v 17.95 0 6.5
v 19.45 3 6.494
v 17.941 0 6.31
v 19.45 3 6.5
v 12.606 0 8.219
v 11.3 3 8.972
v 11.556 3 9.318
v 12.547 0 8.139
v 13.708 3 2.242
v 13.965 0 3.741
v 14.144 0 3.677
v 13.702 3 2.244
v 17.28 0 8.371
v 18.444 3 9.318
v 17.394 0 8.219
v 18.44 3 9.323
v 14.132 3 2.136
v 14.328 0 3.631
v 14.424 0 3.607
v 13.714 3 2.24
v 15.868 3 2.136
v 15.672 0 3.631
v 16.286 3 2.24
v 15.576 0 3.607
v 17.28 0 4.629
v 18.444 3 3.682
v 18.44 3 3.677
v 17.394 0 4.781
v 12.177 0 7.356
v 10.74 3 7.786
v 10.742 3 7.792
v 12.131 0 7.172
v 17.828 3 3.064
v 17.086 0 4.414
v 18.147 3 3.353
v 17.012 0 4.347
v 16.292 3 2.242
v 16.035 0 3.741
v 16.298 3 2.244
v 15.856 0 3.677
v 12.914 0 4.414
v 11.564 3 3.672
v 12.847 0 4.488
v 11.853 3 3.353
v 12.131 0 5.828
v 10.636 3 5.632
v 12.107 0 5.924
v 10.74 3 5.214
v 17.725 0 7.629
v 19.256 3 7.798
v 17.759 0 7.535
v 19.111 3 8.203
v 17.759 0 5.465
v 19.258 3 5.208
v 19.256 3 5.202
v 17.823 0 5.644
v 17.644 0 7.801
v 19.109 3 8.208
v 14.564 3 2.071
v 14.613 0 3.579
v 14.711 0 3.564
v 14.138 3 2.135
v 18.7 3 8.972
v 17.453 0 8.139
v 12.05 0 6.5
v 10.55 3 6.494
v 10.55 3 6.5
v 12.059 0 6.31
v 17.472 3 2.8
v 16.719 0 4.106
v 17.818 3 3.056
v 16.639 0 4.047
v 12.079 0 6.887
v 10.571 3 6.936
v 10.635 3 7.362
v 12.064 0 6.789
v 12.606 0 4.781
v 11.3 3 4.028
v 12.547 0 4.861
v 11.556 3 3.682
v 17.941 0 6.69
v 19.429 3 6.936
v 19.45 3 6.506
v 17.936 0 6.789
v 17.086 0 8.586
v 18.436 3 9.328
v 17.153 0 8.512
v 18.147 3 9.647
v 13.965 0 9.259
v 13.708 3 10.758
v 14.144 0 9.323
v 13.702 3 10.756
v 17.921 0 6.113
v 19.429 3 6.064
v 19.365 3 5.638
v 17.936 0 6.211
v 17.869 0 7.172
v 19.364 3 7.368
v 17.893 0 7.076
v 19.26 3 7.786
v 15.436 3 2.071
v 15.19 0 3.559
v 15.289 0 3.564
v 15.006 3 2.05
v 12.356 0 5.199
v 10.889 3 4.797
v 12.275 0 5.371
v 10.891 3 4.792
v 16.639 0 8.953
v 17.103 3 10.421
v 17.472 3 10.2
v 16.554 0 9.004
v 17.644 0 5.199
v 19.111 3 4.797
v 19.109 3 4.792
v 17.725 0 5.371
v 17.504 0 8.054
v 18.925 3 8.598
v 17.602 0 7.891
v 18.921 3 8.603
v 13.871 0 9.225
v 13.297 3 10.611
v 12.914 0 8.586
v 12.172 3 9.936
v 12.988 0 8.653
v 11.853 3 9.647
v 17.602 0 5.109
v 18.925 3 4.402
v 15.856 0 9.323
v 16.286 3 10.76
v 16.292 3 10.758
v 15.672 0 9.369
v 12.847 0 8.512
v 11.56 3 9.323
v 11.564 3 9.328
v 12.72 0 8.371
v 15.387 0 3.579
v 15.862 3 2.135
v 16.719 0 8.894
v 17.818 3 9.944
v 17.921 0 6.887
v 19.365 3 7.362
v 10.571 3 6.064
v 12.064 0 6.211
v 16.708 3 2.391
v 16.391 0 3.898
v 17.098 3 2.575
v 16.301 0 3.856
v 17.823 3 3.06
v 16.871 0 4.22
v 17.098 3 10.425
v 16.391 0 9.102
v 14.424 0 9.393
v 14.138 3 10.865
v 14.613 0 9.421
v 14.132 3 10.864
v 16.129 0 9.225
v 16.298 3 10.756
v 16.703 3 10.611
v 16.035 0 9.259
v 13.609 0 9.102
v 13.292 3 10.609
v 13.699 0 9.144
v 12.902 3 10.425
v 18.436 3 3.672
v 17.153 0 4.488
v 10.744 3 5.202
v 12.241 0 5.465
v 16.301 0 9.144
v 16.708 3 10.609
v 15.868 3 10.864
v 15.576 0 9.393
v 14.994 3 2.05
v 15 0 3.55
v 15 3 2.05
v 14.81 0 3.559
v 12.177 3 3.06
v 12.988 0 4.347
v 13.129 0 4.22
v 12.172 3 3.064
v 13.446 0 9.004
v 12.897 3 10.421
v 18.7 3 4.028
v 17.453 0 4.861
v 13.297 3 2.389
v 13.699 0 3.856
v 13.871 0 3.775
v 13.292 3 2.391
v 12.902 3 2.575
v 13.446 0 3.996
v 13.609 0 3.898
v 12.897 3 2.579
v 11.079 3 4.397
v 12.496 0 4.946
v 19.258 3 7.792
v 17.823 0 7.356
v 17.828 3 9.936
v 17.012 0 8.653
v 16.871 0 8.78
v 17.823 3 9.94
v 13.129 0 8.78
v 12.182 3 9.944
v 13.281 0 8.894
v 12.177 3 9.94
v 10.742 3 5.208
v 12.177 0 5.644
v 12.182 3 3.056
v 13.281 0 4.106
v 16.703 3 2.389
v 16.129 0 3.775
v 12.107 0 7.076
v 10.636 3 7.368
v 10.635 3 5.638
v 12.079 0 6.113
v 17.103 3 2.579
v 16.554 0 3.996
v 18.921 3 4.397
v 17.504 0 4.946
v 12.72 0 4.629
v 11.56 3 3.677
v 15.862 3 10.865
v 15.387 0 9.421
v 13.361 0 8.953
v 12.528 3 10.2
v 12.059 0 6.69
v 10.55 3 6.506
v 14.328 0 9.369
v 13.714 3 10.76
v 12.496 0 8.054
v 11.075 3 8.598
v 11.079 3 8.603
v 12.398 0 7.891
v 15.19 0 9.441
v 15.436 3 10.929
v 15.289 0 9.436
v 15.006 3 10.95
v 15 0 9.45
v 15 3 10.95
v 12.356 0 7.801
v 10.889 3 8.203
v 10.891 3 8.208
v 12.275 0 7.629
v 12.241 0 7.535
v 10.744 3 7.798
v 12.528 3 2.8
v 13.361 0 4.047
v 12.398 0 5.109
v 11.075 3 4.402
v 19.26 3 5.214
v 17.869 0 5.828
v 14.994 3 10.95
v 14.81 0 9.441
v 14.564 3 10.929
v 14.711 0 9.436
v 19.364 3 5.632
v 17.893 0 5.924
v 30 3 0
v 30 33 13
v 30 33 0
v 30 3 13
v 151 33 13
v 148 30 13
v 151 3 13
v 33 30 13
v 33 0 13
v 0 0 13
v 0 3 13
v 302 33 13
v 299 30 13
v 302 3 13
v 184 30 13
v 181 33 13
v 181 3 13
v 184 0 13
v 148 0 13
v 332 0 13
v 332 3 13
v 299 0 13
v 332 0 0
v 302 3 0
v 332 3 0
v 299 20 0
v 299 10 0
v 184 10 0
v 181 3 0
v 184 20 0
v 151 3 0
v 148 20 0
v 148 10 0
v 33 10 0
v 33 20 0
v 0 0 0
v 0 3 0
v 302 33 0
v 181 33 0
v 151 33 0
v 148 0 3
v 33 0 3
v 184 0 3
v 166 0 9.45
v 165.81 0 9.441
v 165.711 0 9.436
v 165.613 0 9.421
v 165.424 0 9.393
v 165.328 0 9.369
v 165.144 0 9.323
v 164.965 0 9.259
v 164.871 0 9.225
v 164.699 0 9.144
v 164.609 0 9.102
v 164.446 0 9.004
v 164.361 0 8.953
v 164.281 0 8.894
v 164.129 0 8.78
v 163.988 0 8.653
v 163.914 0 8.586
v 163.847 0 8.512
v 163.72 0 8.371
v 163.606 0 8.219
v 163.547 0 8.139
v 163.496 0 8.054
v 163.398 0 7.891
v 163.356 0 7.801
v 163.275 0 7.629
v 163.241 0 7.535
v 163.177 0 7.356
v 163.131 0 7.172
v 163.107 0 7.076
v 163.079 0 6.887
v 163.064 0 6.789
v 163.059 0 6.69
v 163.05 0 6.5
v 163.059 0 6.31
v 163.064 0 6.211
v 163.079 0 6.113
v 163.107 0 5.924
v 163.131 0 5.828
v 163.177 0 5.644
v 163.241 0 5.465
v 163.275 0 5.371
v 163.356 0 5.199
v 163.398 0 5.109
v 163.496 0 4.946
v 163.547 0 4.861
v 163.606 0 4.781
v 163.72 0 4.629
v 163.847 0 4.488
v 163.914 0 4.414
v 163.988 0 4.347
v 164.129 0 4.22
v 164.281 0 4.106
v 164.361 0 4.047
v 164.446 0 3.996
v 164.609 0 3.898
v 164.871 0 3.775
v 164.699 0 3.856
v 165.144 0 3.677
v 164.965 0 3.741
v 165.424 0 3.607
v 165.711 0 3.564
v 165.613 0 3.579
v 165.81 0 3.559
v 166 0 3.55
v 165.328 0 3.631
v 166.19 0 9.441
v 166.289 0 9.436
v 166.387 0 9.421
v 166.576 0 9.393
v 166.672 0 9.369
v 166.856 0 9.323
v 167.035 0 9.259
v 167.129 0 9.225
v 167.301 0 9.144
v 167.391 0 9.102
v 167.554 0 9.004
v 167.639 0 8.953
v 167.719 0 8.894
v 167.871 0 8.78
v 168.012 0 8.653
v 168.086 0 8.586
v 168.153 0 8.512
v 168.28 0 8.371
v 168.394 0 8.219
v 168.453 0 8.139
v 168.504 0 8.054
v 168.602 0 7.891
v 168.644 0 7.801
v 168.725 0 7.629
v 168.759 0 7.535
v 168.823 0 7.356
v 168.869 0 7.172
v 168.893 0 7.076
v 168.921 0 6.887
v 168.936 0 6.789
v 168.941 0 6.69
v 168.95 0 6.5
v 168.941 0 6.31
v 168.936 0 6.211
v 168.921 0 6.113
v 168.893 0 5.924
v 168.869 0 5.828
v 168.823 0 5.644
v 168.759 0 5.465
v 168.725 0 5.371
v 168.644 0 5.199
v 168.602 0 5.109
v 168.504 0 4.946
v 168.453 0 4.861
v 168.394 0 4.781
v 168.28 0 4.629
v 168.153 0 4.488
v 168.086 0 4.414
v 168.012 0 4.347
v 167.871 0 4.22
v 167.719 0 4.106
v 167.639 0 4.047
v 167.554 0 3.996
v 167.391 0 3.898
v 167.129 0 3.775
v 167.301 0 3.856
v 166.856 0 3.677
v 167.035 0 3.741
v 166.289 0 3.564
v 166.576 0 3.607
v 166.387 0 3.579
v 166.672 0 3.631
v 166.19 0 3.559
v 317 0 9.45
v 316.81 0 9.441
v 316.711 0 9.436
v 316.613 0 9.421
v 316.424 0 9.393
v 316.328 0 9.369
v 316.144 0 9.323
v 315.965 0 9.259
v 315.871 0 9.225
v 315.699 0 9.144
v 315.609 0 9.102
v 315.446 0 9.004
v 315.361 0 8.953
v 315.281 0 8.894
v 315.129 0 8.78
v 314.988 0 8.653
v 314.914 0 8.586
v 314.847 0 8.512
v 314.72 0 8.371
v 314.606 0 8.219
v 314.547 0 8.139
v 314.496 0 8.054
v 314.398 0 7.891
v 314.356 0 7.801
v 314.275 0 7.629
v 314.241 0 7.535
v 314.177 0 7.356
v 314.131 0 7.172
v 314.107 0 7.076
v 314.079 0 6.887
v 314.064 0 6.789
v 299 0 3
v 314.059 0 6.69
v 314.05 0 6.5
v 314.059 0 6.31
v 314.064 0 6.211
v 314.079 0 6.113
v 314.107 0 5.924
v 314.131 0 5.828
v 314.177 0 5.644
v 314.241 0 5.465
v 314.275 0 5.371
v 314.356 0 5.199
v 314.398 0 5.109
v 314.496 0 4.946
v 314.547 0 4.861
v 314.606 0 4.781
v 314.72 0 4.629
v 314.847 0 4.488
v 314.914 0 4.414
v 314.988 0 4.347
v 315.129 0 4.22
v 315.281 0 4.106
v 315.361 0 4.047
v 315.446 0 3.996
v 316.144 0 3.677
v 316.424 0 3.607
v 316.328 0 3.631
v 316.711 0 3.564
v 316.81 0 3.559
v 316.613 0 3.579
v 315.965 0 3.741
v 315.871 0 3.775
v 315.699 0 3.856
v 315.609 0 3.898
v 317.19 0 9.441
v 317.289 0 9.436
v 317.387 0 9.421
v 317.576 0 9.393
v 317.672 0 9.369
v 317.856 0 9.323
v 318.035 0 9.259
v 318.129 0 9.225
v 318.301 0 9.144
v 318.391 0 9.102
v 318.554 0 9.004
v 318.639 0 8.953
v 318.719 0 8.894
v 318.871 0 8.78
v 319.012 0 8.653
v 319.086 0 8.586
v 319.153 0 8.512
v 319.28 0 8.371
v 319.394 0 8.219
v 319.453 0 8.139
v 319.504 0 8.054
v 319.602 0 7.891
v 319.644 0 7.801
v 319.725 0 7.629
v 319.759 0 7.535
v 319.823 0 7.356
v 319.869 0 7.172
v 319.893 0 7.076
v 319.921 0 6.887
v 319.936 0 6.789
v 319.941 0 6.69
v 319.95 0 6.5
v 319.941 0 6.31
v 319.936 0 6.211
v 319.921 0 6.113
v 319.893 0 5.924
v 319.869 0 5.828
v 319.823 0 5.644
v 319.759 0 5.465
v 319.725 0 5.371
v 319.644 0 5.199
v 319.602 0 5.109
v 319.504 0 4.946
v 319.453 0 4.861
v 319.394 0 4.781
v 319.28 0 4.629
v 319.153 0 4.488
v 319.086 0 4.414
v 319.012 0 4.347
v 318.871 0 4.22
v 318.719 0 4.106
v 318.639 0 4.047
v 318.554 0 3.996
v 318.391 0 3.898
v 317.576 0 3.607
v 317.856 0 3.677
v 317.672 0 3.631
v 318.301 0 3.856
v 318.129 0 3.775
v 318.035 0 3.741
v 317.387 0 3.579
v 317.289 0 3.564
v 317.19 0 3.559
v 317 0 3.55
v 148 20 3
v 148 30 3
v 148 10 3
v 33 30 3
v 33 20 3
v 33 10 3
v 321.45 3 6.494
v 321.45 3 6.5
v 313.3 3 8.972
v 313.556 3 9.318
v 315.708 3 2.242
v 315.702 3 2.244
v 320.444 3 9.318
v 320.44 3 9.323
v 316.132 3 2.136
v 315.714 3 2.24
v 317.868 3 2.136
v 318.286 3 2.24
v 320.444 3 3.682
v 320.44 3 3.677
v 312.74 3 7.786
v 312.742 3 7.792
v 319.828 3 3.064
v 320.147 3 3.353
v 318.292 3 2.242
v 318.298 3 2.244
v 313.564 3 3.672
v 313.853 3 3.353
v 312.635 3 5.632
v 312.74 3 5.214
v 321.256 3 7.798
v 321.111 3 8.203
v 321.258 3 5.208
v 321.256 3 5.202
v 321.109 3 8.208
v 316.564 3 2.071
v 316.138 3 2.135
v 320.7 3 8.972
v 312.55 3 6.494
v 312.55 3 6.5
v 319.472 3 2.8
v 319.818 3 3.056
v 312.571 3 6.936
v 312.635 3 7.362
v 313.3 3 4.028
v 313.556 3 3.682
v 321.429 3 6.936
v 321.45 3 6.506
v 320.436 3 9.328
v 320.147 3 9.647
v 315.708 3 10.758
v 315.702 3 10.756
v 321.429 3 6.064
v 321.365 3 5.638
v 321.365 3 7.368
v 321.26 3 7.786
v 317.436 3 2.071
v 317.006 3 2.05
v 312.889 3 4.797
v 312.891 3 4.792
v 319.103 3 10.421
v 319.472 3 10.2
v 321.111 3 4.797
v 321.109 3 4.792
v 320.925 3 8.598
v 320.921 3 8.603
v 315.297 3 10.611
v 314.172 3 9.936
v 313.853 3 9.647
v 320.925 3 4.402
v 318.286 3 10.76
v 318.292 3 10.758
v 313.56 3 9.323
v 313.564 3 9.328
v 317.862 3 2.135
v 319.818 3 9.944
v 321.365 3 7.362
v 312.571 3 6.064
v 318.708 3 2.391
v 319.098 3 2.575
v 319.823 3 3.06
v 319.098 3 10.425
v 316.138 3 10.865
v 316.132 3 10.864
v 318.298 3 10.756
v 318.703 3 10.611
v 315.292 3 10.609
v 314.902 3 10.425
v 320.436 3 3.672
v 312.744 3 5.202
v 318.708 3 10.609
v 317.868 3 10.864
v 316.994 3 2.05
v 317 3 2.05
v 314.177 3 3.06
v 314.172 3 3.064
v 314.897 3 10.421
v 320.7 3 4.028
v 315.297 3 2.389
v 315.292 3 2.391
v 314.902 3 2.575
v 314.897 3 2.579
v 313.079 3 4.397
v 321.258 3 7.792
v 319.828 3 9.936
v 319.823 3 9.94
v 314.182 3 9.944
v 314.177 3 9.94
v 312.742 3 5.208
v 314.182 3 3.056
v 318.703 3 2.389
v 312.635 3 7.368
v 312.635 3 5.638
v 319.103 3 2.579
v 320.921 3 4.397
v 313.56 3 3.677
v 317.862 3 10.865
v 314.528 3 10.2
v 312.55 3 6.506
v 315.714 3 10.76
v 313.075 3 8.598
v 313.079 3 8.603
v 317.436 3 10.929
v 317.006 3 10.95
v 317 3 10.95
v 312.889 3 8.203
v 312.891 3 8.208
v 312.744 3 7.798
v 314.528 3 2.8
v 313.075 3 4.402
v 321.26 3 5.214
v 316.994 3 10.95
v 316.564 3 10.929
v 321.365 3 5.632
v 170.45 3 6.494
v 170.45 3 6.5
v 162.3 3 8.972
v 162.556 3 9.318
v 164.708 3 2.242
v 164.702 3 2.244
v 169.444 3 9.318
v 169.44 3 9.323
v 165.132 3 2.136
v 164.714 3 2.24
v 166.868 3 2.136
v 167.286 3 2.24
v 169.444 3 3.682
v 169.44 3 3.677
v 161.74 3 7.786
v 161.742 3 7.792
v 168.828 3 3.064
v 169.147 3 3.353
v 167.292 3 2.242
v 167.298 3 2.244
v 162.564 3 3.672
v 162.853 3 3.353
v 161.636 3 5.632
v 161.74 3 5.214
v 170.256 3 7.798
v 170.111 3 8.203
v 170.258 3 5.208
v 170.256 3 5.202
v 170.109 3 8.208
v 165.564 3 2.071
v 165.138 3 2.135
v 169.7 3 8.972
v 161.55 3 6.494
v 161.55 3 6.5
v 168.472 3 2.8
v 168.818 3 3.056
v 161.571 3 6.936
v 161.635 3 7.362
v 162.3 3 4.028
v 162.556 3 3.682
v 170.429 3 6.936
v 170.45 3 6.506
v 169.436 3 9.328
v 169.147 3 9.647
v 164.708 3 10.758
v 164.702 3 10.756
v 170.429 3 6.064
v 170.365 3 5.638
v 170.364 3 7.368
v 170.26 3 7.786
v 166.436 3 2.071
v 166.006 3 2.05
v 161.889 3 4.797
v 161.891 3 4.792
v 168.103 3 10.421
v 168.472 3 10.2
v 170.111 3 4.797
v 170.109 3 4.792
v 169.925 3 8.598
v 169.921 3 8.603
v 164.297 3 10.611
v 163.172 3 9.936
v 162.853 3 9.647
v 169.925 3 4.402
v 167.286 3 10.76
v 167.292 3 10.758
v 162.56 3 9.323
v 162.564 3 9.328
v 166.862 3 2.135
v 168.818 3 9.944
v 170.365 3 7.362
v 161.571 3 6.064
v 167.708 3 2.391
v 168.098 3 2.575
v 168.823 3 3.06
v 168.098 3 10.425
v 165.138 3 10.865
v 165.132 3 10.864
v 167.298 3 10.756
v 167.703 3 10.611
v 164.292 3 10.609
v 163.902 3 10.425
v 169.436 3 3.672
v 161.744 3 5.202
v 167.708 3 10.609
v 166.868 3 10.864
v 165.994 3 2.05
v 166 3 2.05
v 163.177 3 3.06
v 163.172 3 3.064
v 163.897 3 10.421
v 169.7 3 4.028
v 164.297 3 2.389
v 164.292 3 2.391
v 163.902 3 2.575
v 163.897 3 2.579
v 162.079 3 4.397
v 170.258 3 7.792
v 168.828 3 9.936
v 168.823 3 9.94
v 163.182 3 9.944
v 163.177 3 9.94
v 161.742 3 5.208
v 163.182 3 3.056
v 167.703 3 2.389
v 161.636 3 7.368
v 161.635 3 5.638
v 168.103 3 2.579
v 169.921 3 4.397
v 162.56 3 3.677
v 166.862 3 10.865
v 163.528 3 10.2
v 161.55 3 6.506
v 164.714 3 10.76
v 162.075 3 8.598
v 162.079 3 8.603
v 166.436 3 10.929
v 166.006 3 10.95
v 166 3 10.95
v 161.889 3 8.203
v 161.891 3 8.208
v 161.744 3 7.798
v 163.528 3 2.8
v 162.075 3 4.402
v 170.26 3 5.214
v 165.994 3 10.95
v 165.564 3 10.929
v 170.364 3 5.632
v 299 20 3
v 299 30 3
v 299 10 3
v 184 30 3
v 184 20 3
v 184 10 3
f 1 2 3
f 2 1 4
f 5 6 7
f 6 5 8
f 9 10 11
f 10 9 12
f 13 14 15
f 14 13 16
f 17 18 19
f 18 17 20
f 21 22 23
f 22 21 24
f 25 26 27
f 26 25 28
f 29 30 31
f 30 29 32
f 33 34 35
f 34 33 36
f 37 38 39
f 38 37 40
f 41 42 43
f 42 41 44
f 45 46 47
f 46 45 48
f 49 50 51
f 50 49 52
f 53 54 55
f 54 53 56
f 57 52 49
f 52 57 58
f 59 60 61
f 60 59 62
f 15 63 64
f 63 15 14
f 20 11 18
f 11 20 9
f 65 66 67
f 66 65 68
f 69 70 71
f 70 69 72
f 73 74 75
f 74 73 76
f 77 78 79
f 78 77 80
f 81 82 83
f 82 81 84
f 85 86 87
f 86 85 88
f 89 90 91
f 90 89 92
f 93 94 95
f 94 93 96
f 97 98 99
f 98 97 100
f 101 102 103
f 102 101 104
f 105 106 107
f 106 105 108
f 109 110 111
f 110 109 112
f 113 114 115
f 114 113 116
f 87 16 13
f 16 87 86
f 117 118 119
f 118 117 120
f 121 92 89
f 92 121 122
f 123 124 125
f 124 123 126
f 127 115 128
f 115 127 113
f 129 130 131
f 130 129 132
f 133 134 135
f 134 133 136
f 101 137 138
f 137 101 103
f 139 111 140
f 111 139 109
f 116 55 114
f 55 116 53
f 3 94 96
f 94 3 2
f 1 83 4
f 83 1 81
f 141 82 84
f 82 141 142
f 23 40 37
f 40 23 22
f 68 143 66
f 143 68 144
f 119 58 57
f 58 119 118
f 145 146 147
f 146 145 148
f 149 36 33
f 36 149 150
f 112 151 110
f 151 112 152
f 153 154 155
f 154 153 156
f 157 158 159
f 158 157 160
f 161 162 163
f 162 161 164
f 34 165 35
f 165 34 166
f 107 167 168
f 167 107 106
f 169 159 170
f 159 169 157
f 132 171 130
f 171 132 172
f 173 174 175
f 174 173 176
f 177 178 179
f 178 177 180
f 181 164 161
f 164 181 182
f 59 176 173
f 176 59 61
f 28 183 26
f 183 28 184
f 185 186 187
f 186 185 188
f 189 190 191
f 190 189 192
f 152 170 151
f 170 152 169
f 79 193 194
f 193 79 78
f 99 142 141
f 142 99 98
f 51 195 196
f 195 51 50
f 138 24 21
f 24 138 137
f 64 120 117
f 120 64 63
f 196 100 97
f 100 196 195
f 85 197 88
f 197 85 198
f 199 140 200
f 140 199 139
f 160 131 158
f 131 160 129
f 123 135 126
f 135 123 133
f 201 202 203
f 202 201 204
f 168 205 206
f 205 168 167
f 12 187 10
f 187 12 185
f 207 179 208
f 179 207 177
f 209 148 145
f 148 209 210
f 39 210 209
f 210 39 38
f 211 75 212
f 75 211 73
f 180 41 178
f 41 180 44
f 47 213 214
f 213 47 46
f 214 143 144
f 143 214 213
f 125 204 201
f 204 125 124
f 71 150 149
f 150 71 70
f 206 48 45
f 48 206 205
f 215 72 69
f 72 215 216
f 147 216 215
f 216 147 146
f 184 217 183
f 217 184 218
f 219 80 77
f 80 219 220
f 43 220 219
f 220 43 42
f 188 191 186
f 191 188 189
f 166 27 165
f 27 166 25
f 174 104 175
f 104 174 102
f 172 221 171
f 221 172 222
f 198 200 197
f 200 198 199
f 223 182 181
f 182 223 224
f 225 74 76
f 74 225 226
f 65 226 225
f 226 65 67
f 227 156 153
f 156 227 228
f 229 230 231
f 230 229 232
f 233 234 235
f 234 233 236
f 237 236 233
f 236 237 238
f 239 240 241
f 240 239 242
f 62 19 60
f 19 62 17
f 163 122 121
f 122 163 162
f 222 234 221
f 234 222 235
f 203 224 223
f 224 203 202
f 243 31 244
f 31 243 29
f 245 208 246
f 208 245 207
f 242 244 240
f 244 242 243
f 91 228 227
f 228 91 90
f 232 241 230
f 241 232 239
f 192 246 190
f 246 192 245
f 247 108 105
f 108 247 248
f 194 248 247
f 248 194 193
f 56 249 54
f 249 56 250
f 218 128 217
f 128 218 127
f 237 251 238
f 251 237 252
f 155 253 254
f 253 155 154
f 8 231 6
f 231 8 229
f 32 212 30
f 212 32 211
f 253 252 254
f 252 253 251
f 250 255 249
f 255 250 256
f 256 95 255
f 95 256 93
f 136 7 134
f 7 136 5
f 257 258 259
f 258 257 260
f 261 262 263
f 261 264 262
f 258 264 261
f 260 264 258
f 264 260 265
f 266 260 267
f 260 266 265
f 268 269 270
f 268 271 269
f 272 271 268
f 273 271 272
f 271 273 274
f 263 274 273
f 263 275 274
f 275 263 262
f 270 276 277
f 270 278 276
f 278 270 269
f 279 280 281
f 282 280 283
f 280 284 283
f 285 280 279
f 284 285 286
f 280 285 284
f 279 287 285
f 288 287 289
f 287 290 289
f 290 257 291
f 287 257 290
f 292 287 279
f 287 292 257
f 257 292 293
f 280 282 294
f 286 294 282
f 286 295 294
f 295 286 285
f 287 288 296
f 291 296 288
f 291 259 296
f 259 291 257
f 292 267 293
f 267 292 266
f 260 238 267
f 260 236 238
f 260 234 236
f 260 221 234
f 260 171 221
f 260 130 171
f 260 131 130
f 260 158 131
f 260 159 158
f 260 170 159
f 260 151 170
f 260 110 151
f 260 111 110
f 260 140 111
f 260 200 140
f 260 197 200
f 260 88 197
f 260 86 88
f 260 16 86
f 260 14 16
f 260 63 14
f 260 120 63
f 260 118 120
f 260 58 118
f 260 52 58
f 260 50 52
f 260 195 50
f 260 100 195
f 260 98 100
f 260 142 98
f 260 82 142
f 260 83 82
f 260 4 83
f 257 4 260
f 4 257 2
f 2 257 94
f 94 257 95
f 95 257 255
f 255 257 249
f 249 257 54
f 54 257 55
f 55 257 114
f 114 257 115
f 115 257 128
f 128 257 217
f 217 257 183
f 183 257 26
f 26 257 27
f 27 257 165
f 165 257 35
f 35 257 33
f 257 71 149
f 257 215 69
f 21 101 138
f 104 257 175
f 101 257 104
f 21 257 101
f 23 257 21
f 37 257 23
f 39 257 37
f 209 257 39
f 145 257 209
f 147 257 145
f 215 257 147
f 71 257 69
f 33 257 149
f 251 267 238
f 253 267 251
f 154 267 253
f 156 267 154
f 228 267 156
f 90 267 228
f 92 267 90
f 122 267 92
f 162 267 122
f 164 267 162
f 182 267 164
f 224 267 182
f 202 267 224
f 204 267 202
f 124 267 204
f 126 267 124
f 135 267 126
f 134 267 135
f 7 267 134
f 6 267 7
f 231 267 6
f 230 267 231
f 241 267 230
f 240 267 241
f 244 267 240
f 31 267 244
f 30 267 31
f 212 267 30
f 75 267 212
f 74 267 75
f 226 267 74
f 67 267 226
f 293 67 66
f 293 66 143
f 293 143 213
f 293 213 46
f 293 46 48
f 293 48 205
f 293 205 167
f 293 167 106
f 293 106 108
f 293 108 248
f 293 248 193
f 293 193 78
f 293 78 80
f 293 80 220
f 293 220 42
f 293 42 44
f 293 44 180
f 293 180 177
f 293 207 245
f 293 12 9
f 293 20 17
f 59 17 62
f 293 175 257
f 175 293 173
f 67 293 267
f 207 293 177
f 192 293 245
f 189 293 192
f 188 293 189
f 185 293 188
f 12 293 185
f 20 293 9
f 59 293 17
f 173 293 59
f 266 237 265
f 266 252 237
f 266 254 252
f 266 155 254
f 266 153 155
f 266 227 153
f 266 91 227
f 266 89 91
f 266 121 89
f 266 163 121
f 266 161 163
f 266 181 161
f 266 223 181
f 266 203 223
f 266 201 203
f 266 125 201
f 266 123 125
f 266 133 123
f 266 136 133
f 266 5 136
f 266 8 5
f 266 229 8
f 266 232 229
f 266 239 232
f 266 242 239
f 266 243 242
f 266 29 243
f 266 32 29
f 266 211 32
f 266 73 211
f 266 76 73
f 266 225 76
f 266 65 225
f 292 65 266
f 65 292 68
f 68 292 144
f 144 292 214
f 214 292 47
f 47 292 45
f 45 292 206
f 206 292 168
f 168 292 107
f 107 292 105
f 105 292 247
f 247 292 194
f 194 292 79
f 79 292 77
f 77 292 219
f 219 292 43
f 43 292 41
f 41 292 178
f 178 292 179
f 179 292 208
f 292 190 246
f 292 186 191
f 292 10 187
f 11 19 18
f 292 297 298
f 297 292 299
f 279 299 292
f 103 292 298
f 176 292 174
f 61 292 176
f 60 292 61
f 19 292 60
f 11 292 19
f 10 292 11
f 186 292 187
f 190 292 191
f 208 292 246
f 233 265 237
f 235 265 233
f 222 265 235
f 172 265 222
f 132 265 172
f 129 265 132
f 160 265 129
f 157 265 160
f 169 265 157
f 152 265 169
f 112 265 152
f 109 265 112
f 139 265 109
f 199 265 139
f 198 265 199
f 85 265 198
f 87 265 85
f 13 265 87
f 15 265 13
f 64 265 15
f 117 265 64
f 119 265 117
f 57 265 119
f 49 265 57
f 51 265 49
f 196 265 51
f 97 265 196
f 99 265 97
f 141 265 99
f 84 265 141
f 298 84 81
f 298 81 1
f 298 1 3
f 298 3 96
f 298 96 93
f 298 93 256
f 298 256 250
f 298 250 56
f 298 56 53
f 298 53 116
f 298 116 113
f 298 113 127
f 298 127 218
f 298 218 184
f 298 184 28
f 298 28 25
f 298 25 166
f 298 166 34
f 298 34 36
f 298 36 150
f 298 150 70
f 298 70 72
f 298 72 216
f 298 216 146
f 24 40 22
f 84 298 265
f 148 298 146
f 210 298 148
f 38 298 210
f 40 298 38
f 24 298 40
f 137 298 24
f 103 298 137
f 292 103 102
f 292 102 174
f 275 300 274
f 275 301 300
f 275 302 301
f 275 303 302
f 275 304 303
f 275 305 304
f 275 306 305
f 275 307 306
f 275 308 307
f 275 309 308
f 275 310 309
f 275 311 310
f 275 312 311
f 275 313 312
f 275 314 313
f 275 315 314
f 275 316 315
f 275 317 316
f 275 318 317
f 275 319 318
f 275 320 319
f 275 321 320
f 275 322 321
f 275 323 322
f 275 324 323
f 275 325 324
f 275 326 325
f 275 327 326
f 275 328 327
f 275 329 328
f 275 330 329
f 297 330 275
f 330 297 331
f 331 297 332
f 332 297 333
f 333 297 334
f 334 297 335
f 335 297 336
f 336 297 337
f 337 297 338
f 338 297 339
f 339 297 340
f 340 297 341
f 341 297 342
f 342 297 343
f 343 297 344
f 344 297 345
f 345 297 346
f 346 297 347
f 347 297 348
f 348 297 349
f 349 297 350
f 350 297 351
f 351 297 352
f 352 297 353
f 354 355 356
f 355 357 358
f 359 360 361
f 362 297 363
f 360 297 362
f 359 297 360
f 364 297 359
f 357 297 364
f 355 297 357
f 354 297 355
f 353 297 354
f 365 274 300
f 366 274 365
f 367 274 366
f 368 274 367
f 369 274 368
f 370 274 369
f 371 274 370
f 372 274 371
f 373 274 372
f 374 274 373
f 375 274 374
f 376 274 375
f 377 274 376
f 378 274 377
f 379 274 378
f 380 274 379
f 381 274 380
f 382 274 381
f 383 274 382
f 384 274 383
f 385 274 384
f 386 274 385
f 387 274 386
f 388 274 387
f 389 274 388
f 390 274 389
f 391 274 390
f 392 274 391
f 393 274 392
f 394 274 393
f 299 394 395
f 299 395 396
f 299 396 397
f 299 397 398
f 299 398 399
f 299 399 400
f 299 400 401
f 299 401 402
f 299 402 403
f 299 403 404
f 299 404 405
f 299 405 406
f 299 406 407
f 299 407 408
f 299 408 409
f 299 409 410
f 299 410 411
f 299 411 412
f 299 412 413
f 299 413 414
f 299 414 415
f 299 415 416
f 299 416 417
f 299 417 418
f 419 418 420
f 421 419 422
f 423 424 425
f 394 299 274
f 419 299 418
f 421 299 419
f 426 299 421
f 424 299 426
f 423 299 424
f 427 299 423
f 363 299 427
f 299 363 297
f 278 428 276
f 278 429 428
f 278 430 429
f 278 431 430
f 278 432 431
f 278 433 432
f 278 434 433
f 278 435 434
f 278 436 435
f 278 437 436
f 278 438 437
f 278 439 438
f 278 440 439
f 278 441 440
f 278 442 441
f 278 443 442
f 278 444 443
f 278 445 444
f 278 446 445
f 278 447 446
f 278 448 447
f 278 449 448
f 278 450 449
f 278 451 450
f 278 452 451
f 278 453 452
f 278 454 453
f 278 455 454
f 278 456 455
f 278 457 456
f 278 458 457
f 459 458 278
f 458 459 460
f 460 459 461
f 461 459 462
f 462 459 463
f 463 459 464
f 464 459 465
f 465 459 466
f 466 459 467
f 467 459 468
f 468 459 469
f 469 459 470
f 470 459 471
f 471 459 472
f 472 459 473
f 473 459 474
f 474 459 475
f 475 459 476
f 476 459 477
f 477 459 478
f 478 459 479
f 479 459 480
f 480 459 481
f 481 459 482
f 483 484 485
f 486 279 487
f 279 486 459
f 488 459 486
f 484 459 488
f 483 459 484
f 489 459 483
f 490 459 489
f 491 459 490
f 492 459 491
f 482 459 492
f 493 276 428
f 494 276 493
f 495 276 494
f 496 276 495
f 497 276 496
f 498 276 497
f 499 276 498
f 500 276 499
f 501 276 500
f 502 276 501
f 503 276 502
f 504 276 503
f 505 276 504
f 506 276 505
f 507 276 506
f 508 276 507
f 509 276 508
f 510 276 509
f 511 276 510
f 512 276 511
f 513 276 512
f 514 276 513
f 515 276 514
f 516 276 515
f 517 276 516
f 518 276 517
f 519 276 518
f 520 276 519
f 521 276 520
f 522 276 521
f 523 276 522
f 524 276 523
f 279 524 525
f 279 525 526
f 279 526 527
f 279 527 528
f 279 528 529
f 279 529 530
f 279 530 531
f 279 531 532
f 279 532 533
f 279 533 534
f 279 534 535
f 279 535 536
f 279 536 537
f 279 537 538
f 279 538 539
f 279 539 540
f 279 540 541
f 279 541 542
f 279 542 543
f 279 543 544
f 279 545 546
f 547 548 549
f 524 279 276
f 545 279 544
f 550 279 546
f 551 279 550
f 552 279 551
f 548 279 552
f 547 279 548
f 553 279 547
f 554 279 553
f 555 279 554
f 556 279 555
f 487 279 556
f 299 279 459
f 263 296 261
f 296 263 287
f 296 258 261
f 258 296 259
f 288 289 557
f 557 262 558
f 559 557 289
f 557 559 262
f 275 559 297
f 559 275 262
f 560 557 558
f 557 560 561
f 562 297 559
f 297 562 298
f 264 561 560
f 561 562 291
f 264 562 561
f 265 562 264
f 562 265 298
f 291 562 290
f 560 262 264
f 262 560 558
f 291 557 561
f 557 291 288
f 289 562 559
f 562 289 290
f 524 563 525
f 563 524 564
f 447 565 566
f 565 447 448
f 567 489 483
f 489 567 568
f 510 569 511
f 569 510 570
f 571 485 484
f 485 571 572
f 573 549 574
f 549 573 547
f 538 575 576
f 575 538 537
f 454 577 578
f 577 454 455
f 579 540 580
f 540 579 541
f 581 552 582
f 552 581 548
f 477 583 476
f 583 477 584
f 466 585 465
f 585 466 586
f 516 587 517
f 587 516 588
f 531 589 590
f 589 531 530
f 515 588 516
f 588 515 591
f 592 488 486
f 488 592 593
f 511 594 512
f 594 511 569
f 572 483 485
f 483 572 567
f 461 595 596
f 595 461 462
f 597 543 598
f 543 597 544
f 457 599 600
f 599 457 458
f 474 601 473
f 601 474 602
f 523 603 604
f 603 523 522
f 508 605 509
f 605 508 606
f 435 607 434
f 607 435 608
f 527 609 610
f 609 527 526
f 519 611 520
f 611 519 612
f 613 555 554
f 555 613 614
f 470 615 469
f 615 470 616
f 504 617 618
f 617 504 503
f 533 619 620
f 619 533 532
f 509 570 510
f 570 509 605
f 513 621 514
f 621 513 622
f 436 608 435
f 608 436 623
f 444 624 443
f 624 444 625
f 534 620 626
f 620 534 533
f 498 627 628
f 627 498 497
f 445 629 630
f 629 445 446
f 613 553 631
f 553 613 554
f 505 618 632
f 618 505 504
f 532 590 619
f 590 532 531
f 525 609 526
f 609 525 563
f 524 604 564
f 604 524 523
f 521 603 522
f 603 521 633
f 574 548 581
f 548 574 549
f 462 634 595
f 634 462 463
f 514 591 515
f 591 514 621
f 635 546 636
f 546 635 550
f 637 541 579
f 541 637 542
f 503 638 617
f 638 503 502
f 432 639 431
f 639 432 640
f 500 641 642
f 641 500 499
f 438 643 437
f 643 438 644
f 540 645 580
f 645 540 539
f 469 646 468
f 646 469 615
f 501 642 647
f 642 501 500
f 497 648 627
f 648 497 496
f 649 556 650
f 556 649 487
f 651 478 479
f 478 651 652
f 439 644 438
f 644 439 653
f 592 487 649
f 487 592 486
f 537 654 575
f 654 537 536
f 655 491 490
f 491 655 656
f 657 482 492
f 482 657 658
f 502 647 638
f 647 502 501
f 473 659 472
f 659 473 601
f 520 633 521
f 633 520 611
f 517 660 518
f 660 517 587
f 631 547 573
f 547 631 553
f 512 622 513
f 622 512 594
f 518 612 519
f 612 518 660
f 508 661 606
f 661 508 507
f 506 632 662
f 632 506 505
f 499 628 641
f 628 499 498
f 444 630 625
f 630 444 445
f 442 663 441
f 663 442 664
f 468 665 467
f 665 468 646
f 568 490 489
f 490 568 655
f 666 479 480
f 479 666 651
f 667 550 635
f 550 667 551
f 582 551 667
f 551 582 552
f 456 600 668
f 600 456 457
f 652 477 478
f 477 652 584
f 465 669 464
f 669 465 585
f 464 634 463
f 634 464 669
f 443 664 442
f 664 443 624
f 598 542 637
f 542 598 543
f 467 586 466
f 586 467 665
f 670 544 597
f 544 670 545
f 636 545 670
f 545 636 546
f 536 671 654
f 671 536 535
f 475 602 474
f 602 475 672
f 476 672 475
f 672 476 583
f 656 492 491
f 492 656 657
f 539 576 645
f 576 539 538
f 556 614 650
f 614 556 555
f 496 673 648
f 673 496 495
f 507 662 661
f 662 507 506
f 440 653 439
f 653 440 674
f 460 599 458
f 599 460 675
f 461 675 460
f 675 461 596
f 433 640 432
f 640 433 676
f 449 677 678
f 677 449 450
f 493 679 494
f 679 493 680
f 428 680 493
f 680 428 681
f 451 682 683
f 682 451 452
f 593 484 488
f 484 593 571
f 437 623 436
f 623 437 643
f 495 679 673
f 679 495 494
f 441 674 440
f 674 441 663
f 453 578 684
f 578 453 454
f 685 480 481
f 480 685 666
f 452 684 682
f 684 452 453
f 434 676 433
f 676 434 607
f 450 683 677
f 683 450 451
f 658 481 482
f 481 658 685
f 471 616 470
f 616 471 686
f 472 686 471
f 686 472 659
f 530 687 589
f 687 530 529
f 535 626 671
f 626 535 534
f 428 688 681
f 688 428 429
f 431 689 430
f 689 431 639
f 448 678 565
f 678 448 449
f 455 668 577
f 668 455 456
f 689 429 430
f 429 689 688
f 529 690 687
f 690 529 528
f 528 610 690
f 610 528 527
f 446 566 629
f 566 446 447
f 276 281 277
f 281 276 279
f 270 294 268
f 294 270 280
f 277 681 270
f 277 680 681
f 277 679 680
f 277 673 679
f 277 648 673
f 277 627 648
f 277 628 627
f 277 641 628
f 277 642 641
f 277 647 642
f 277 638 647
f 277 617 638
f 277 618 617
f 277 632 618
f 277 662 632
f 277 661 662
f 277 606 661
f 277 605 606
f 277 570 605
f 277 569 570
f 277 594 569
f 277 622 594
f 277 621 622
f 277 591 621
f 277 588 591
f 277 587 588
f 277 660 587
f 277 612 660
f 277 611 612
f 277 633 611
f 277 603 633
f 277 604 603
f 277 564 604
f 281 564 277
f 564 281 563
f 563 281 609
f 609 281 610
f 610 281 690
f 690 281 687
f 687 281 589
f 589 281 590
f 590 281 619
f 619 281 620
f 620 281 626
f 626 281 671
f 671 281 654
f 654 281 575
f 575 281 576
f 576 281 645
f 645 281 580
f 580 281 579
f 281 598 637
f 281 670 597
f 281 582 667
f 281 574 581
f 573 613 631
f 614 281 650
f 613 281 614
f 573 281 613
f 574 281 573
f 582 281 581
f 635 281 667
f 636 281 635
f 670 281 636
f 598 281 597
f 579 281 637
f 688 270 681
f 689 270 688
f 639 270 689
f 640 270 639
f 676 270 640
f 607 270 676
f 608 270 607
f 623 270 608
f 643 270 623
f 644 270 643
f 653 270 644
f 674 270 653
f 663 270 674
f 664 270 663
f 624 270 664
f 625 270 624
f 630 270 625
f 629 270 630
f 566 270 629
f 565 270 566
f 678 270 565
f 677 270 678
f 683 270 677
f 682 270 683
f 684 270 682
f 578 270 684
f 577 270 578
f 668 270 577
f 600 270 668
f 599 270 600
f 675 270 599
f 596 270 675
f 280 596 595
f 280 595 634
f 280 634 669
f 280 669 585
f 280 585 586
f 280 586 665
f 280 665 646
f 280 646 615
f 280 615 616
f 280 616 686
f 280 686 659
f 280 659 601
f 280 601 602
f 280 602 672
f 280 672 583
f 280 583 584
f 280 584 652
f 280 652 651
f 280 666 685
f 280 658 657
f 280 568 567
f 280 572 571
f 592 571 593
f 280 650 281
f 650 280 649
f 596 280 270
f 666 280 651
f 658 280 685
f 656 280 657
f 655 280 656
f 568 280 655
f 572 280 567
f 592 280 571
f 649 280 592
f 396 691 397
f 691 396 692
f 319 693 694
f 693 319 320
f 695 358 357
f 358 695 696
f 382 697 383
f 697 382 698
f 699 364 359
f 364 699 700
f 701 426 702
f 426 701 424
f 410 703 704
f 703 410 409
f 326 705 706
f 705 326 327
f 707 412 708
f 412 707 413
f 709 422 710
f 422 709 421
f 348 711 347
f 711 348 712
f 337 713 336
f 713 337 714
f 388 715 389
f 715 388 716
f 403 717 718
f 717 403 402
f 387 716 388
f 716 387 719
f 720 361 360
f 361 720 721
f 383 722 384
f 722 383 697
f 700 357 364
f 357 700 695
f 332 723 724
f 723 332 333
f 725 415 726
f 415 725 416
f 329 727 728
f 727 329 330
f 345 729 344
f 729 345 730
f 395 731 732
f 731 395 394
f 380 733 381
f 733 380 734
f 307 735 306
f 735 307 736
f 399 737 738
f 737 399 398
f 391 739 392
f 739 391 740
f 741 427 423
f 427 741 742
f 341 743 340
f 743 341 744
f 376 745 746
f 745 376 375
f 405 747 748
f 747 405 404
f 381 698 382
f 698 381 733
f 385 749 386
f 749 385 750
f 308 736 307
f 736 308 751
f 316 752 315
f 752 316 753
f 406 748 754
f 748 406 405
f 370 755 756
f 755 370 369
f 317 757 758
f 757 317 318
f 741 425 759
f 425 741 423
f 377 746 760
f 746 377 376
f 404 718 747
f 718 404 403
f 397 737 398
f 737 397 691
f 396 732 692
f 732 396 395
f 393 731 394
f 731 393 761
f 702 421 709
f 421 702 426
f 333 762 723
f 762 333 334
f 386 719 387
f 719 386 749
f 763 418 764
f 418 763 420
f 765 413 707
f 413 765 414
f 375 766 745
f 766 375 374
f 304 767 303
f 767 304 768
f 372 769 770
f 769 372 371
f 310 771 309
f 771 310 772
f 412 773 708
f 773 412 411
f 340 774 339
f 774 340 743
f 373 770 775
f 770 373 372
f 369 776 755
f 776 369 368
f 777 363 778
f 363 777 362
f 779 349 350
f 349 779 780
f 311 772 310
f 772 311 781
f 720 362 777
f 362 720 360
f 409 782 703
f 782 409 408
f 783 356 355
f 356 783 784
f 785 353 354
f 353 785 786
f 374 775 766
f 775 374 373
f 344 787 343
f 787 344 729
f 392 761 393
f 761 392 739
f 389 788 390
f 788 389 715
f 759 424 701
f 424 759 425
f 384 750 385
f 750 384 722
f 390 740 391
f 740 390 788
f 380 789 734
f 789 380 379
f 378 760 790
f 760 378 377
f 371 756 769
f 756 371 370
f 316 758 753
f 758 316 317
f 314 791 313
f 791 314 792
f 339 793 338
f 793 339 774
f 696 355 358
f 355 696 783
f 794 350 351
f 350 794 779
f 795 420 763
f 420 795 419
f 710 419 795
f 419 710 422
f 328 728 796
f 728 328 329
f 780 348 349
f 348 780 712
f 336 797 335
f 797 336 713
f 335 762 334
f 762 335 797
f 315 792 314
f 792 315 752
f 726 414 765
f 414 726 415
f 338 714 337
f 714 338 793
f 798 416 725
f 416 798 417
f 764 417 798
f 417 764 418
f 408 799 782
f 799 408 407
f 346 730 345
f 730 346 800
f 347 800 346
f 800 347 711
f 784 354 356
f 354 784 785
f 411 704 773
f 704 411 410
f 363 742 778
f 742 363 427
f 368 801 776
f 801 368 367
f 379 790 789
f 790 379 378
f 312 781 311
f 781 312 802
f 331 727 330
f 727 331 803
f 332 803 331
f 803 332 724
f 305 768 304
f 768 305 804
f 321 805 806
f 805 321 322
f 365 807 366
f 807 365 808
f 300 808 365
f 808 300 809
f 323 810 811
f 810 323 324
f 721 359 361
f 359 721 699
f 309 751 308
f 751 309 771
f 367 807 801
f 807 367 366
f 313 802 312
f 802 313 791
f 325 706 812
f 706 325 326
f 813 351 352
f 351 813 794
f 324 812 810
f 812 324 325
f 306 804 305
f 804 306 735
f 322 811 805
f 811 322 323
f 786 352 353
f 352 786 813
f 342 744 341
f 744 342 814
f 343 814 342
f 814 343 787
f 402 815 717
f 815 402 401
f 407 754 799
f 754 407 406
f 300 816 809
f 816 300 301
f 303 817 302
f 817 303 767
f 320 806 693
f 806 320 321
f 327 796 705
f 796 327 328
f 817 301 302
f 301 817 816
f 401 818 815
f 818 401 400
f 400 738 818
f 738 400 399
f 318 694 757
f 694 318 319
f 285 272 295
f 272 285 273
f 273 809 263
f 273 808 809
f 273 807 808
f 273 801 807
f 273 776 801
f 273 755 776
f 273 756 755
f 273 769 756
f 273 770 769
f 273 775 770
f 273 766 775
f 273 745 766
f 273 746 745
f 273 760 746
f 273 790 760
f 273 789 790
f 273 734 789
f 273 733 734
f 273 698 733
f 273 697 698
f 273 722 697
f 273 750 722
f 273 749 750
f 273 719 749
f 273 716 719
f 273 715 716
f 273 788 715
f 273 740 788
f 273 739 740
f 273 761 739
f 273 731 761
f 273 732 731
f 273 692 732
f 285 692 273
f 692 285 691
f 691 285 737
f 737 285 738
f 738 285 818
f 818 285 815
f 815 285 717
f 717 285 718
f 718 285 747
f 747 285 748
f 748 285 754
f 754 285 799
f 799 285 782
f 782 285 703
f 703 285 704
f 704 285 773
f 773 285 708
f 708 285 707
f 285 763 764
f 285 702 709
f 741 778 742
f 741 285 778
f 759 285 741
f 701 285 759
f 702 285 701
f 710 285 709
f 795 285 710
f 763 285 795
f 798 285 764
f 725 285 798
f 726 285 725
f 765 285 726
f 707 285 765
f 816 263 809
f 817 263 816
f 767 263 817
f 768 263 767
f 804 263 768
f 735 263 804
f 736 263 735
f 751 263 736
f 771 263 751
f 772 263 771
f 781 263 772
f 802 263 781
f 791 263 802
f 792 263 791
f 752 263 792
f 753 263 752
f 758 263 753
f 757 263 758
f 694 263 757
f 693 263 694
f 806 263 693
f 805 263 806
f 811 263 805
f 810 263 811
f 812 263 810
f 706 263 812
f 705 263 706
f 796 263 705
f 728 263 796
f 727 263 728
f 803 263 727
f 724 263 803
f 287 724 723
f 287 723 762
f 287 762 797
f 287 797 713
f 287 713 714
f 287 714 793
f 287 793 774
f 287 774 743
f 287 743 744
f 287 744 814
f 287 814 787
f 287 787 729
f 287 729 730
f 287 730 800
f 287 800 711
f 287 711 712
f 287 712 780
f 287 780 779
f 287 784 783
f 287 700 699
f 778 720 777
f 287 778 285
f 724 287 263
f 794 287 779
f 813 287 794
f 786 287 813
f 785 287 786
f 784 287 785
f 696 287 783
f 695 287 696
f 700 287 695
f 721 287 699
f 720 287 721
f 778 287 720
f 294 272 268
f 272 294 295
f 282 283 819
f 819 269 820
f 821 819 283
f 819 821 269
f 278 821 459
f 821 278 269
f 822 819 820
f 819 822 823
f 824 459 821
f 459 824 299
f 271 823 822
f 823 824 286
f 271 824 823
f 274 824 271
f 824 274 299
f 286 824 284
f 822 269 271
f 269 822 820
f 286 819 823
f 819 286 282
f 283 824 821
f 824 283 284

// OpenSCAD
$fn = $preview ? 32 : 64;

count=2;

L=215;
W=115;
H=30;
MOUNT_HOLE_INSET=32.5; // Distance from edges for mounting holes

// Customizable parameters
thickness = 3;           // Wall thickness of mount
mount_height = 10;       // Total height of mounting bracket
screw_hole_d = 5;        // Diameter of mounting screw holes
screw_head_d = 9;        // Diameter of screw head for countersink
screw_head_h = 4;        // Height of countersink
spacing = 30;            // Space between multiple mounts

vent_h=10;
vent_inset=10;

module powersupply_mount(width=W, height=H, t=thickness, m_height=mount_height,
                        hole_inset=MOUNT_HOLE_INSET) {
        difference() {
                cube([width+2*t, height+t, m_height+t]);
                translate([t,0,t]) cube([width, height, m_height]);
                translate([t,vent_inset,0]) cube([width, vent_h, t]);
        }
}

module mounting_hole(hole_d=screw_hole_d, head_d=screw_head_d, head_h=screw_head_h, t=thickness) {
    // Screw shaft
    rotate([-90, 0, 0])
        cylinder(d=hole_d, h=t + 2);
    // Countersink
    translate([0, t - head_h + 0.1, 0])
        rotate([-90, 0, 0])
            cylinder(d1=hole_d, d2=head_d, h=head_h);
}

module mounting_ears(l=spacing, h=mount_height+thickness, t=thickness) {
        difference() {
                cube([l, t, h]);
                translate([l/2, 0, h/2]) mounting_hole();
        }
}

// Create array of mounts
for (i = [0:count-1]) {
    translate([(W + 2 * thickness + spacing) * i, 0, 0]) {
        mounting_ears();
        translate([spacing, 0, 0]) powersupply_mount();
    }
    translate([(W + 2 * thickness + spacing) * count, 0, 0]) mounting_ears();
}
